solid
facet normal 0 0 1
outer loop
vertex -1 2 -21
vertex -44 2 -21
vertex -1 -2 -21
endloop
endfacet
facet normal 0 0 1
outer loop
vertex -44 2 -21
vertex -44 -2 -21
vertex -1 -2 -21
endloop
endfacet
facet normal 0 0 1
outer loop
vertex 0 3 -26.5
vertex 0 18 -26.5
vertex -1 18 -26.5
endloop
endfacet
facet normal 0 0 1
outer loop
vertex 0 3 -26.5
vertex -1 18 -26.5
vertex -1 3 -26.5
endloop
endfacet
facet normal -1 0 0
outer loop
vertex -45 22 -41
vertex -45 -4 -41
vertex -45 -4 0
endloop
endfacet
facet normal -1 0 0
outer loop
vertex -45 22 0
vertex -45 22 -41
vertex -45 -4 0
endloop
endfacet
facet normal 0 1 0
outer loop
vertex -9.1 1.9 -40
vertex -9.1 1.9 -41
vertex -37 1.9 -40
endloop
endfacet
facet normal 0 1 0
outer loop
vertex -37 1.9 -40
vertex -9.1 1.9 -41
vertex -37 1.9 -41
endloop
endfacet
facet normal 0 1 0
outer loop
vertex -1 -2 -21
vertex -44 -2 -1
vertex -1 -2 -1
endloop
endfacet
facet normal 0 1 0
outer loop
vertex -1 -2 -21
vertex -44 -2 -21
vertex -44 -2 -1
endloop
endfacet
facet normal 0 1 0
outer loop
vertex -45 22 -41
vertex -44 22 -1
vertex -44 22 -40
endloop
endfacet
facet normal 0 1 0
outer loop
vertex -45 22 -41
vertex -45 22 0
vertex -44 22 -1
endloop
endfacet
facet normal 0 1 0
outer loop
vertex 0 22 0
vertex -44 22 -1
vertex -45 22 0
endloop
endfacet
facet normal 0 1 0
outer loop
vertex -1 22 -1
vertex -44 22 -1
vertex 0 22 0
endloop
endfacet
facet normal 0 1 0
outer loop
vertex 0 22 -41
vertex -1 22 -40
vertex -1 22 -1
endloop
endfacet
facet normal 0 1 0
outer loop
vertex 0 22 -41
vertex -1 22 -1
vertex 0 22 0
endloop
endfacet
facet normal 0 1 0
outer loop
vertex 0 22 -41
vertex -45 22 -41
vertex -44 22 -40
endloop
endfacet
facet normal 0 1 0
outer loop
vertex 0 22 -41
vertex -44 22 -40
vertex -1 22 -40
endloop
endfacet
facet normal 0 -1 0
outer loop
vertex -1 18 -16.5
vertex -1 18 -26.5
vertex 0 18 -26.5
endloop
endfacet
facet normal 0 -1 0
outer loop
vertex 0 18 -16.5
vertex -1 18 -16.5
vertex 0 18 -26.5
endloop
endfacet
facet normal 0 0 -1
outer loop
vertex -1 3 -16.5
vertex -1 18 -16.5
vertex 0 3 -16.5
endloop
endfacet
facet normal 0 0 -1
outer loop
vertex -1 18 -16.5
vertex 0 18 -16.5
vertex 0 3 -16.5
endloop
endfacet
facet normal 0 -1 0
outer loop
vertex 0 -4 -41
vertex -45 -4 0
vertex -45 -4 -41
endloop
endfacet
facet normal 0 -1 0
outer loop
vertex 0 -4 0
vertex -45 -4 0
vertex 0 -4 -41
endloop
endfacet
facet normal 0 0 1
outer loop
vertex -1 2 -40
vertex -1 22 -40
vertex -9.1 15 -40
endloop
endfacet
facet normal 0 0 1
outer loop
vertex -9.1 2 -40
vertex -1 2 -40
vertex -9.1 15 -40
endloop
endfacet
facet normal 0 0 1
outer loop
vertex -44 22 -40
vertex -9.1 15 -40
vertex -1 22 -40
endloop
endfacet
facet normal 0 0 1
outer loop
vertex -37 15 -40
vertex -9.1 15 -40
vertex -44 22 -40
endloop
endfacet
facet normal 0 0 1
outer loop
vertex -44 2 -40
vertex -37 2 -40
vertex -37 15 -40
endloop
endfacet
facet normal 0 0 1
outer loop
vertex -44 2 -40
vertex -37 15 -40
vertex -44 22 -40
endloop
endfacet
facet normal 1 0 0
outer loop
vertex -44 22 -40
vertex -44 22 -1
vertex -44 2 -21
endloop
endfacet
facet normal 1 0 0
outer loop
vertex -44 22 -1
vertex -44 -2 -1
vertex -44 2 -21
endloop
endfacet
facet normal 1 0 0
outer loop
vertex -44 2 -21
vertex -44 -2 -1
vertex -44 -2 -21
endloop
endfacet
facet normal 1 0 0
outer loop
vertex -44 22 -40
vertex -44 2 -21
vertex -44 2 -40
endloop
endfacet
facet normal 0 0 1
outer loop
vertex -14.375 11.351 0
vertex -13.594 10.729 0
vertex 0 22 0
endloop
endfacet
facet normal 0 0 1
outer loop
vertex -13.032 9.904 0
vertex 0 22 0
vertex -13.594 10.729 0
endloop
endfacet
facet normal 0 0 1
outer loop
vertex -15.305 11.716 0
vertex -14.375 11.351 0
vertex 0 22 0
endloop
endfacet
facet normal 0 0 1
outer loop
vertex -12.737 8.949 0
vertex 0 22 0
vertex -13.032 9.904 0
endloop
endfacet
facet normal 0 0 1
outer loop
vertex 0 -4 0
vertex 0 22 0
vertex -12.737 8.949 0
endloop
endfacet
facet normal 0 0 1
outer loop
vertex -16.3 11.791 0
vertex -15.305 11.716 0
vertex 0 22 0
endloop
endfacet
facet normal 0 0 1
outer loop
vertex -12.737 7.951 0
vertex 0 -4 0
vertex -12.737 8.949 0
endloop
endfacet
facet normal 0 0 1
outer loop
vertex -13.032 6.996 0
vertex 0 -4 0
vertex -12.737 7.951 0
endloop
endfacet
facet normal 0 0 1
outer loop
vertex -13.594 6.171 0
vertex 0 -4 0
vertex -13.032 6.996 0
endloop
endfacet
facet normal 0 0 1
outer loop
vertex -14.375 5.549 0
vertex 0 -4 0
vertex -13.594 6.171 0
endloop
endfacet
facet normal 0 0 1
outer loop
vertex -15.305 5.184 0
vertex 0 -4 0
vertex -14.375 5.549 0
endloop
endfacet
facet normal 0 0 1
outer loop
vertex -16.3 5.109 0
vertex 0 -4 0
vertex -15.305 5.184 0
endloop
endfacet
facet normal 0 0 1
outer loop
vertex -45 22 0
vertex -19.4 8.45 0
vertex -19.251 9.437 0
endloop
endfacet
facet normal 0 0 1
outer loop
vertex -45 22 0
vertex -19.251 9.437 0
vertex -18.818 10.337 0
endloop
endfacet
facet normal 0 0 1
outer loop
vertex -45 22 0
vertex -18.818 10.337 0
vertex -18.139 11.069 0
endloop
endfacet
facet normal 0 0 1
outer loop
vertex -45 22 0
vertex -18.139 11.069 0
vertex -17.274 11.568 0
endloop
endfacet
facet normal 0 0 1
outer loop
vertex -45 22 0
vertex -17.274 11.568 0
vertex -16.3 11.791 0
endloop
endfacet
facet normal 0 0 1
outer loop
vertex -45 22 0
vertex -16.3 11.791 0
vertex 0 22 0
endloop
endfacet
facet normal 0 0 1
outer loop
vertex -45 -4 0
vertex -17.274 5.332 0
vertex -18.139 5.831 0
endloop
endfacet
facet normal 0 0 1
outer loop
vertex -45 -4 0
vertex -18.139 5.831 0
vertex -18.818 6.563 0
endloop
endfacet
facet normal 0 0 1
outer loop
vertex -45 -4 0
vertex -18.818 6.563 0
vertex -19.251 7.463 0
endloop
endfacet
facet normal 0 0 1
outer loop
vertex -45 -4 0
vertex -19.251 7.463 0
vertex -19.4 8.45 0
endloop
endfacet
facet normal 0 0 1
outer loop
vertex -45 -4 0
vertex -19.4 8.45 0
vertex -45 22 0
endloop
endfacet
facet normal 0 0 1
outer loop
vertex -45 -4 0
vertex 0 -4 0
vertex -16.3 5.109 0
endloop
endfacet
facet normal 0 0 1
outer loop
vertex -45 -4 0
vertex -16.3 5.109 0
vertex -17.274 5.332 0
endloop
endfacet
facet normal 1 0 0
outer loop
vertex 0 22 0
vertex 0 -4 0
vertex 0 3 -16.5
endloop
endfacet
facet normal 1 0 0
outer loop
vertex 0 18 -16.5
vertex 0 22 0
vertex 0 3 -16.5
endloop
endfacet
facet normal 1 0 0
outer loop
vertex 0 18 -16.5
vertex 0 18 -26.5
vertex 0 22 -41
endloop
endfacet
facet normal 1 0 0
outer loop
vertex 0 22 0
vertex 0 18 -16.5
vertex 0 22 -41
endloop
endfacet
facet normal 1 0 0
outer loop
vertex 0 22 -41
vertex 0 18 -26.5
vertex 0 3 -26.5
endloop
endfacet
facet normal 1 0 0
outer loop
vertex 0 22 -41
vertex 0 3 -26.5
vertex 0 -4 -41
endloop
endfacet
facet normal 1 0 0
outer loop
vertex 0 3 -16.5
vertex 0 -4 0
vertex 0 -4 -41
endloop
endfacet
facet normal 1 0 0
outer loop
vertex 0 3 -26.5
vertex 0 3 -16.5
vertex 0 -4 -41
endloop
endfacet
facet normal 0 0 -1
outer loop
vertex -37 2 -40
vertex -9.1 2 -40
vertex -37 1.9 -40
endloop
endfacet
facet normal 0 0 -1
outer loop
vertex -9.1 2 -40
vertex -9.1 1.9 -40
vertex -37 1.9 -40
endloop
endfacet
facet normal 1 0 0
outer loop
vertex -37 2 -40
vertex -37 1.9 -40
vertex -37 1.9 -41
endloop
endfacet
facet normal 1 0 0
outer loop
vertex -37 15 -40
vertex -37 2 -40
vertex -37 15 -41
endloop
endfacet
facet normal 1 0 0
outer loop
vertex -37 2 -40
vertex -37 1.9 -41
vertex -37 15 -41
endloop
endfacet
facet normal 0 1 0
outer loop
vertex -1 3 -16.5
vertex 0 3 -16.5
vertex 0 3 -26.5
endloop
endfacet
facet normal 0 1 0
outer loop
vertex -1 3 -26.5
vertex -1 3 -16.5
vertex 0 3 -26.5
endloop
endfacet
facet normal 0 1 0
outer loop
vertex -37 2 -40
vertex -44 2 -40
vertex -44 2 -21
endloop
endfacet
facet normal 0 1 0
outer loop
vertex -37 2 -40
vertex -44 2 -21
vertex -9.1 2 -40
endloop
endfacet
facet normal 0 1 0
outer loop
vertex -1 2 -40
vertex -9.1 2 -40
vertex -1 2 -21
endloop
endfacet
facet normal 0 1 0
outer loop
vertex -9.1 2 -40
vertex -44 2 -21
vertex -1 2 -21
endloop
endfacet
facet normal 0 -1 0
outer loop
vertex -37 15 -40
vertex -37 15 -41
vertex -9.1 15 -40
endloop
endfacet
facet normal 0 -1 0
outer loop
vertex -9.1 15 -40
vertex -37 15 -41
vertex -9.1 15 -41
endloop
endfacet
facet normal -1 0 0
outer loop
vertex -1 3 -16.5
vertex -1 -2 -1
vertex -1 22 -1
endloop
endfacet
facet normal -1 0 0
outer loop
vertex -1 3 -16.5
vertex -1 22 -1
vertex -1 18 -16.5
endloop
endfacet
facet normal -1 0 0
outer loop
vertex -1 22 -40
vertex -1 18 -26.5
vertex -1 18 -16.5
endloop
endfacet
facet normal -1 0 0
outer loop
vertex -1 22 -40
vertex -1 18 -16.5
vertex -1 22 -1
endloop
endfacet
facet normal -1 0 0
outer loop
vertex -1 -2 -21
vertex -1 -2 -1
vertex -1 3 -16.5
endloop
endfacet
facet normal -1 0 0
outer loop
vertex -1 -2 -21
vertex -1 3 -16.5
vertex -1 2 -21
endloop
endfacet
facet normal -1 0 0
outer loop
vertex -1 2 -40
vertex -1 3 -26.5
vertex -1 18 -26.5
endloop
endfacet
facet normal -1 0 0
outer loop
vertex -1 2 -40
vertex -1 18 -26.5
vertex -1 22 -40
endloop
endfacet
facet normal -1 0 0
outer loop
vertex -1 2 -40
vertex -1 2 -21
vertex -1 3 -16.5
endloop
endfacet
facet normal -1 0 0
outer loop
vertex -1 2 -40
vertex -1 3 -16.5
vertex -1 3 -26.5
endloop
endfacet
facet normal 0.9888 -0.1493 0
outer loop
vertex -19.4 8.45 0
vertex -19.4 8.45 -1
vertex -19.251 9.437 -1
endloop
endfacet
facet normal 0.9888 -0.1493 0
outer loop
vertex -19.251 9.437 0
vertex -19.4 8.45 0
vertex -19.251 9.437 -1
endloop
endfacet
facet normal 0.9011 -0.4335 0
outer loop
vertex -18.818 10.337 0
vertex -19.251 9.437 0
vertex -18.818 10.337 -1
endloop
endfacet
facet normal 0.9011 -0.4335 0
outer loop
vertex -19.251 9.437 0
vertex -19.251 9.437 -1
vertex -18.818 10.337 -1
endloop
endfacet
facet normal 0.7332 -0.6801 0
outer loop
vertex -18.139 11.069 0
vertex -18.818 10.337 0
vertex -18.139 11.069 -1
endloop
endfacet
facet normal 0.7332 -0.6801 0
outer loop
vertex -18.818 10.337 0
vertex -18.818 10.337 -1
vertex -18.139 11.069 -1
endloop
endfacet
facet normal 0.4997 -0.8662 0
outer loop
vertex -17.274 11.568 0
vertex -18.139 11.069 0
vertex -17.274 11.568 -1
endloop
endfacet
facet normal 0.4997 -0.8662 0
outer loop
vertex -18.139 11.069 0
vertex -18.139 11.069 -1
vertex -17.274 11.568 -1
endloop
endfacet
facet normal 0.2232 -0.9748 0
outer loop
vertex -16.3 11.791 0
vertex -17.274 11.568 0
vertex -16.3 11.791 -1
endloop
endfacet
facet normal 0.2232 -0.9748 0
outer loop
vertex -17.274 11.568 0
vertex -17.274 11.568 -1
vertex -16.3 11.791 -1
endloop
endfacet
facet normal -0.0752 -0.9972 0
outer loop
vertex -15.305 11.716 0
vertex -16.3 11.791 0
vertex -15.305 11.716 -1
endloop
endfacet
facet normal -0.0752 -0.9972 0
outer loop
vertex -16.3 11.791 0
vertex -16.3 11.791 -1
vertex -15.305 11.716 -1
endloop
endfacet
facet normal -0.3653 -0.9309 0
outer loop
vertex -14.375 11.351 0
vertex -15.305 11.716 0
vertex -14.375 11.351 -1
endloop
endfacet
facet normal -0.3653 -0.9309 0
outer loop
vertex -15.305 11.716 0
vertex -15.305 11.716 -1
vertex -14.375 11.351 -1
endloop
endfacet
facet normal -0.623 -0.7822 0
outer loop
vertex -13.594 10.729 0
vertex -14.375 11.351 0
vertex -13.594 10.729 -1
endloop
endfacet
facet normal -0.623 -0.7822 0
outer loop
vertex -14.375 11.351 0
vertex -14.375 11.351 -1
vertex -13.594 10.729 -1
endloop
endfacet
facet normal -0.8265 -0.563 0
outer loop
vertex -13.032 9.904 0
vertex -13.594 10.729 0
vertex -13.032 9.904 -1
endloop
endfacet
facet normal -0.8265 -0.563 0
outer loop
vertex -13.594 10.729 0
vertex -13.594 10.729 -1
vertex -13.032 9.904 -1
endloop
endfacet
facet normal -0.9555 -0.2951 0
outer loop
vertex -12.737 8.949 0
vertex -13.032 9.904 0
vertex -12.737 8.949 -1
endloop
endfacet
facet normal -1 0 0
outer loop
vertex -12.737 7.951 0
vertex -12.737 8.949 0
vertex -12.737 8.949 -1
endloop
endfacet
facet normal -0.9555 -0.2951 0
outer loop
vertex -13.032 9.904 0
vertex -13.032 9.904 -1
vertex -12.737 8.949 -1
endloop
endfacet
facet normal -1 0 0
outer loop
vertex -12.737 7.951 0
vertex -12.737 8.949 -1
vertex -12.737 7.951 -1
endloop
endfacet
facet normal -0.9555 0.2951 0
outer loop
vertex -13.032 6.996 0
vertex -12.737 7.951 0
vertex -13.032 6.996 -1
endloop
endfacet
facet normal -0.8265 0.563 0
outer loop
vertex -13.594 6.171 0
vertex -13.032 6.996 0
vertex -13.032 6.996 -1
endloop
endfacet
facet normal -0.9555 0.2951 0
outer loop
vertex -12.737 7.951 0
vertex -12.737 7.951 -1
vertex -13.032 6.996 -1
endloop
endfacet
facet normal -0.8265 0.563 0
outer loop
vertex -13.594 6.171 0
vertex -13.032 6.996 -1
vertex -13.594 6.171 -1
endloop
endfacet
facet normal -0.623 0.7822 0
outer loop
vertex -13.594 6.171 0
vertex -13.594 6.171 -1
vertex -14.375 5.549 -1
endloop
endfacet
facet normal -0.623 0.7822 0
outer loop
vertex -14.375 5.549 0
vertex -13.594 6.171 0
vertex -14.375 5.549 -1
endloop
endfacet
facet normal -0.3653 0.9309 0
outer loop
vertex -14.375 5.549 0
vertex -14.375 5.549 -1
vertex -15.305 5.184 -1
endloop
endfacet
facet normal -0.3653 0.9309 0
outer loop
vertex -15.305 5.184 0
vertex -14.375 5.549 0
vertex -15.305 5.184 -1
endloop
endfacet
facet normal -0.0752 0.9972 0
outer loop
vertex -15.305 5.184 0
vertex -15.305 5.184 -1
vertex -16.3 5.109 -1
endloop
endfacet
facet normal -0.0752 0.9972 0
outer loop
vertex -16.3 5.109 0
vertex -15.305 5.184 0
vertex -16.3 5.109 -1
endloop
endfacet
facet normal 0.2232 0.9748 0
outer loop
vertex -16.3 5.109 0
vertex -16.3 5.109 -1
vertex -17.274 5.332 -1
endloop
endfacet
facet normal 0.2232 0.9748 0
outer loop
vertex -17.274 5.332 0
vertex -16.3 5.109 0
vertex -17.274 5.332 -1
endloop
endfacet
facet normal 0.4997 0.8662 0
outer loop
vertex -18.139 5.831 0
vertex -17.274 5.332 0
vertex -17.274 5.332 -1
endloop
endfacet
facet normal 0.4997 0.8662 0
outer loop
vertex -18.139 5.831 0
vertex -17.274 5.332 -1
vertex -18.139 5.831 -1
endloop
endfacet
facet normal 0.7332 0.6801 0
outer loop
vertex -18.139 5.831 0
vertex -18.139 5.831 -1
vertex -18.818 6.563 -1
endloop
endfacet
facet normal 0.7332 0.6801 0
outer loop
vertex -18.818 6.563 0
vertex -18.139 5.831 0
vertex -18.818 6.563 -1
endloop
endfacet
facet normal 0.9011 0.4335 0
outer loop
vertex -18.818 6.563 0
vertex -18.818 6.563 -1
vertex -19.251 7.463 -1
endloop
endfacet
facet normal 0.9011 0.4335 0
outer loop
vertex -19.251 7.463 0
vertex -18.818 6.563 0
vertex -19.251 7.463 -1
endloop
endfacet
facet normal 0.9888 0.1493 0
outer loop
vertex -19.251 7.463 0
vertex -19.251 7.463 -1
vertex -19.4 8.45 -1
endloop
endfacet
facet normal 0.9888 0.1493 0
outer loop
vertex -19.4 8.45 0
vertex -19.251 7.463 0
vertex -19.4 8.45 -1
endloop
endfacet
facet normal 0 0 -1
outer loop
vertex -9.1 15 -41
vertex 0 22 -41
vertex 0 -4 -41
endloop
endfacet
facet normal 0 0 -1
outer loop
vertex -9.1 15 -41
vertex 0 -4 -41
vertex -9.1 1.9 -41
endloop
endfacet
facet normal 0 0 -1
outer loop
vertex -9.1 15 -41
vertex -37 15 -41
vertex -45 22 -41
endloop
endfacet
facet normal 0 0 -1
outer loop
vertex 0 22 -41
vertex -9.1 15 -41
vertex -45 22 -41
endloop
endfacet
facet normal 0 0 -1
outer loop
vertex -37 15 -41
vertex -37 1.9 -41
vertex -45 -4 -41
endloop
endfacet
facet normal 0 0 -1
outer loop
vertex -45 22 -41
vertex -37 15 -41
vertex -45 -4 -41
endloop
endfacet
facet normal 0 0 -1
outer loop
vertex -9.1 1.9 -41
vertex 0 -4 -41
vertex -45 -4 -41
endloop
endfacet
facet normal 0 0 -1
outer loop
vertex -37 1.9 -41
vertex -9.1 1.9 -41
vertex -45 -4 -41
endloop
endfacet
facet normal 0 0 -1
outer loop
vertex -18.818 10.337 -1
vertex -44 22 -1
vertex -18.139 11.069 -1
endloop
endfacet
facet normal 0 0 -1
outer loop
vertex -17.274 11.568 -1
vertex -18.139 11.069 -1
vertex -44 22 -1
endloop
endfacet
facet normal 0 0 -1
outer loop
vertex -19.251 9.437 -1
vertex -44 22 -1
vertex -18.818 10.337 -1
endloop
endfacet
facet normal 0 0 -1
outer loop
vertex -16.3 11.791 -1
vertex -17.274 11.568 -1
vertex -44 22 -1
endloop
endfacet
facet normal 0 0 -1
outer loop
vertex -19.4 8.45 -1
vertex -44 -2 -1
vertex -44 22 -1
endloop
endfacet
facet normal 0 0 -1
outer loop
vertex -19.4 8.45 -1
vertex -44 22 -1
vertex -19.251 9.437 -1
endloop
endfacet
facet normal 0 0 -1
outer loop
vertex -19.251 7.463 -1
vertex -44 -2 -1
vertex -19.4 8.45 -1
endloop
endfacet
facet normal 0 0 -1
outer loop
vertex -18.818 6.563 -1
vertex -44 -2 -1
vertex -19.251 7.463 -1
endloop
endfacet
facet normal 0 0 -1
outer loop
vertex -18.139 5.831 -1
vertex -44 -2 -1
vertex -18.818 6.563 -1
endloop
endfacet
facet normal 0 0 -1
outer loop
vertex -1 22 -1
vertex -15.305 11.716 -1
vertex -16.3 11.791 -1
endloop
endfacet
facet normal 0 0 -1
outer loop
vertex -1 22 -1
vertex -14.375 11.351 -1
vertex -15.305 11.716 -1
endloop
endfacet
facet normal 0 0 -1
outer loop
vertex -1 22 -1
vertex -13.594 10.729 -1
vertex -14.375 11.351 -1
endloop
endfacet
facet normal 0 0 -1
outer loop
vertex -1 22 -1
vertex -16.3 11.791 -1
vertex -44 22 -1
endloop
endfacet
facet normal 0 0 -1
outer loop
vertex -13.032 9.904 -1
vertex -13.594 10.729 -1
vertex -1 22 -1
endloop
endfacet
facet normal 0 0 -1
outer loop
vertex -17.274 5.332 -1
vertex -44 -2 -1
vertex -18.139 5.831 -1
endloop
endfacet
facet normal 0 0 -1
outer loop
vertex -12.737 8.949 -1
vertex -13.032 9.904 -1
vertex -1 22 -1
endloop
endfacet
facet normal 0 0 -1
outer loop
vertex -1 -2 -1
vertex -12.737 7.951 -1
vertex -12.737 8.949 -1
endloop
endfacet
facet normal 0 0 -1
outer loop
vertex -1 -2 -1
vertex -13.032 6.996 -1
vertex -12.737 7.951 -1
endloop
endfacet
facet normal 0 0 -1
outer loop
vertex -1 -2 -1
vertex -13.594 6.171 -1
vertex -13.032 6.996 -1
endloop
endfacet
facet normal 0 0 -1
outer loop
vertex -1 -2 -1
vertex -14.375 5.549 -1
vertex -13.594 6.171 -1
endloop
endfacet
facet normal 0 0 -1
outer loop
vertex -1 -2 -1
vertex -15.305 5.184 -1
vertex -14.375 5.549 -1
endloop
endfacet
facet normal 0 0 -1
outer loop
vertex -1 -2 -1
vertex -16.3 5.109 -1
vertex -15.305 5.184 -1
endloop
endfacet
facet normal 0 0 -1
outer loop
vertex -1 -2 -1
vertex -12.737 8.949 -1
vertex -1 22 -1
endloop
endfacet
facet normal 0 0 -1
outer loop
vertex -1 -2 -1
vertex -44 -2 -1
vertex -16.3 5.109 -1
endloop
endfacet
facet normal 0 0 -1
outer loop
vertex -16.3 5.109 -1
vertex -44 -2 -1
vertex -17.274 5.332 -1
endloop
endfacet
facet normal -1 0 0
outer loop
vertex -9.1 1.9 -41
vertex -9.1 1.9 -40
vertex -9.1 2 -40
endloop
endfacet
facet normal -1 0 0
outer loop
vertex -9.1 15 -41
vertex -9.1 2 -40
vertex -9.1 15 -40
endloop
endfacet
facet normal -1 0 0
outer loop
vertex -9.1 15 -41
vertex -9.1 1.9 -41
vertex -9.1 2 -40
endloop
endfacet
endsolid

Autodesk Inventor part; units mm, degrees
ref_plane "YZ Plane" through (0, 0, 0) normal (1, 0, 0) x (0, 1, 0)
ref_plane "XZ Plane" through (0, 0, 0) normal (0, 1, 0) x (-1, 0, 0)
ref_plane "XY Plane" through (0, 0, 0) normal (0, 0, 1) x (1, 0, 0)
sketch "Szkic1" plane through (0, 0, 0) normal (0, 1, 0) x (-1, 0, 0)
  line L0 (0, 0) -> (45, 0)
  line L1 (45, 0) -> (45, -41)
  line L2 (45, -41) -> (0, -41)
  line L3 (0, -41) -> (0, 0)
  line L4 (45, 0) -> (44, 0)
  line L5 (44, 0) -> (44, -1)
  line L6 (0, -41) -> (0, -40)
  line L7 (0, -40) -> (1, -40)
  line L8 (1, -40) -> (44, -40)
  line L9 (44, -40) -> (44, -1)
  line L10 (44, -1) -> (1, -1)
  line L11 (1, -1) -> (1, -40)
  dimension "d0" = 45
  dimension "d1" = 41
  dimension "d2" = 1
  dimension "d3" = 1
  dimension "d4" = 1
  dimension "d5" = 1
extrude "Wyciągnięcie proste1" add sketch "Szkic1" along normal blind 18 contours L0 L5 L10 L11 L7 L3 | L0 L1 L2 L3 L7 L8 L9 L5
sketch "Szkic2" plane through (0, 0, -41) normal (0, 0, -1) x (-1, 0, 0)
  line L0 (40, 15) -> (12.1, 15)
  line L1 (12.1, 15) -> (12.1, 1.9)
  line L2 (12.1, 1.9) -> (40, 1.9)
  line L3 (40, 1.9) -> (40, 15)
  line L4 (40, 8.45) -> (38, 8.45)
  line L5 (12.1, 8.45) -> (10.1, 8.45)
  line L6 (10.1, 8.45) -> (38, 8.45)
  line L7 (38, 8.45) -> (38, 15)
  line L8 (38, 15) -> (10.1, 15)
  line L9 (10.1, 15) -> (10.1, 8.45)
  line L10 (38, 8.45) -> (10.1, 8.45)
  line L11 (10.1, 8.45) -> (10.1, 1.9)
  line L12 (10.1, 1.9) -> (38, 1.9)
  line L13 (38, 1.9) -> (38, 8.45)
  line L14 (10.1, 1.9) -> (9.1, 1.9)
  line L15 (9.1, 1.9) -> (9.1, 15)
  line L16 (9.1, 15) -> (10.1, 15)
  line L17 (10.1, 15) -> (10.1, 1.9)
  line L18 (38, 1.9) -> (37, 1.9)
  line L19 (37, 1.9) -> (37, 15)
  line L20 (37, 15) -> (38, 15)
  line L21 (38, 15) -> (38, 1.9)
  point P0 (0, 0)
  point P1 (10.1, 15)
  dimension "d8" = 27.9
  dimension "d9" = 13.1
  dimension "d33" = 2
  dimension "d34" = 2
  dimension "d35" = 1
  dimension "d36" = 1
extrude "Wyciągnięcie proste2" cut sketch "Szkic2" against normal blind 5.25 contours L19 L6 L1 L0 | L1 L5 L9 L8 | L19 L2 L1 L6 | L1 L12 L11 L5 | L9 L11 L14 L15 L16
sketch "Szkic3" plane through (0, 0, -41) normal (0, 0, -1) x (-1, 0, 0)
  line L0 (12.1, 1.9) -> (12.1, 15) projected
  line L1 (12.1, 8.45) -> (21.9, 8.45)
  line L2 (21.9, 8.45) -> (19.05, 8.45)
  circle A0 centre (19.05, 8.45) radius 3.35
  line L3 (19.05, 8.45) -> (16.05, 8.45)
  circle A1 centre (16.05, 8.45) radius 3.35
  point P0 (0, 0)
  dimension "d12" = 9.8
  dimension "d13" = 2.85
  dimension "d14" = 6.7
  dimension "d37" = 3
  dimension "d38" = 6.7
extrude "Wyciągnięcie proste3" cut sketch "Szkic3" against normal blind 48.25 contours L1 A0 A1 | L1 A1 A0 | A0 A1 L1 | L1 A1 A0
sketch "Szkic4" plane through (0, 0, 0) normal (1, 0, 0) x (0, 0, -1)
  line L0 (1, 18) -> (40, 18) projected
  line L1 (20.5, 18) -> (26.5, 18)
  line L2 (26.5, 18) -> (26.5, 3)
  line L3 (26.5, 3) -> (20.5, 3)
  line L4 (20.5, 3) -> (20.5, 18)
  line L5 (20.5, 18) -> (16.5, 18)
  line L6 (16.5, 18) -> (16.5, 3)
  line L7 (16.5, 3) -> (20.5, 3)
  line L8 (20.5, 3) -> (20.5, 18)
  point P0 (0, 0)
  dimension "d17" = 6
  dimension "d18" = 15
  dimension "d19" = 4
extrude "Wyciągnięcie proste4" cut sketch "Szkic4" against normal blind 24.25
sketch "Szkic5" plane through (0, 0, 0) normal (0, -1, 0) x (1, 0, 0)
  line L0 (-1, -40) -> (-1, -26.5) projected
  line L1 (-44, -1) -> (-44, -40) projected
  line L2 (-1, -40) -> (-44, -40)
  line L3 (-44, -40) -> (-44, -21)
  line L4 (-44, -21) -> (-1, -21)
  line L5 (-1, -21) -> (-1, -40)
  line L6 (0, 0) -> (0, -41) projected
  line L7 (0, -41) -> (-45, -41) projected
  line L8 (0, -21) -> (-45, -21)
  line L9 (-45, -21) -> (-45, -41)
  line L10 (-45, -41) -> (0, -41)
  line L11 (0, -41) -> (0, -21)
  dimension "d22" = 19
extrude "Wyciągnięcie proste5" add sketch "Szkic5" against normal blind 2 contours L2 L1 L4 L5 L0
sketch "Szkic6" plane through (0, 0, 0) normal (0, -1, 0) x (1, 0, 0)
  line L0 (0, 0) -> (-45, 0)
  line L1 (-45, 0) -> (-45, -40.9786)
  line L2 (-45, -40.9786) -> (0, -40.9786)
  line L3 (0, -40.9786) -> (0, 0)
extrude "Wyciągnięcie proste6" add sketch "Szkic6" along normal blind 4
sketch "Szkic7" plane through (0, 0, 0) normal (0, 1, 0) x (1, 0, 0)
  line L0 (-1, 1) -> (-44, 1) projected
  line L1 (-44, 21) -> (-1, 21) projected
  line L2 (-44, 1) -> (-1, 1)
  line L3 (-1, 1) -> (-1, 21)
  line L4 (-1, 21) -> (-44, 21)
  line L5 (-44, 21) -> (-44, 1)
  point P0 (0, 0)
extrude "Wyciągnięcie proste7" cut sketch "Szkic7" against normal blind 2
sketch "Szkic8" plane through (0, 0, -40.9786) normal (0, 0, -1) x (-1, 0, 0)
  line L0 (45, -4) -> (0, -4) projected
  line L1 (0, 0) -> (45, 0) projected
  line L2 (45, -4) -> (0, -4)
  line L3 (0, -4) -> (0, 0)
  line L4 (0, 0) -> (45, 0)
  line L5 (45, 0) -> (45, -4)
extrude "Wyciągnięcie proste8" add sketch "Szkic8" along normal blind 0.0214
sketch "Szkic9" plane through (0, 18, 0) normal (0, 1, 0) x (1, 0, 0)
  line L0 (0, 26.5) -> (0, 41) projected
  line L1 (0, 0) -> (-45, 0) projected
  line L2 (0, 41) -> (-45, 41)
  line L3 (-45, 41) -> (-45, 0)
  line L4 (-45, 0) -> (0, 0)
  line L5 (0, 0) -> (0, 41)
  line L6 (-1, 40) -> (-1, 26.5) projected
  line L7 (-44, 1) -> (-44, 40) projected
  line L8 (-1, 40) -> (-44, 40)
  line L9 (-44, 40) -> (-44, 1)
  line L10 (-44, 1) -> (-1, 1)
  line L11 (-1, 1) -> (-1, 40)
extrude "Wyciągnięcie proste9" add sketch "Szkic9" along normal blind 4
sketch "Szkic10" plane through (0, -4, -41) normal (0, 0, -1) x (-1, 0, 0)
  circle A0 centre (16.05, 12.45) radius 3.35 projected
  circle A1 centre (16.05, 12.45) radius 3.35
  point P0 (0, 4)
